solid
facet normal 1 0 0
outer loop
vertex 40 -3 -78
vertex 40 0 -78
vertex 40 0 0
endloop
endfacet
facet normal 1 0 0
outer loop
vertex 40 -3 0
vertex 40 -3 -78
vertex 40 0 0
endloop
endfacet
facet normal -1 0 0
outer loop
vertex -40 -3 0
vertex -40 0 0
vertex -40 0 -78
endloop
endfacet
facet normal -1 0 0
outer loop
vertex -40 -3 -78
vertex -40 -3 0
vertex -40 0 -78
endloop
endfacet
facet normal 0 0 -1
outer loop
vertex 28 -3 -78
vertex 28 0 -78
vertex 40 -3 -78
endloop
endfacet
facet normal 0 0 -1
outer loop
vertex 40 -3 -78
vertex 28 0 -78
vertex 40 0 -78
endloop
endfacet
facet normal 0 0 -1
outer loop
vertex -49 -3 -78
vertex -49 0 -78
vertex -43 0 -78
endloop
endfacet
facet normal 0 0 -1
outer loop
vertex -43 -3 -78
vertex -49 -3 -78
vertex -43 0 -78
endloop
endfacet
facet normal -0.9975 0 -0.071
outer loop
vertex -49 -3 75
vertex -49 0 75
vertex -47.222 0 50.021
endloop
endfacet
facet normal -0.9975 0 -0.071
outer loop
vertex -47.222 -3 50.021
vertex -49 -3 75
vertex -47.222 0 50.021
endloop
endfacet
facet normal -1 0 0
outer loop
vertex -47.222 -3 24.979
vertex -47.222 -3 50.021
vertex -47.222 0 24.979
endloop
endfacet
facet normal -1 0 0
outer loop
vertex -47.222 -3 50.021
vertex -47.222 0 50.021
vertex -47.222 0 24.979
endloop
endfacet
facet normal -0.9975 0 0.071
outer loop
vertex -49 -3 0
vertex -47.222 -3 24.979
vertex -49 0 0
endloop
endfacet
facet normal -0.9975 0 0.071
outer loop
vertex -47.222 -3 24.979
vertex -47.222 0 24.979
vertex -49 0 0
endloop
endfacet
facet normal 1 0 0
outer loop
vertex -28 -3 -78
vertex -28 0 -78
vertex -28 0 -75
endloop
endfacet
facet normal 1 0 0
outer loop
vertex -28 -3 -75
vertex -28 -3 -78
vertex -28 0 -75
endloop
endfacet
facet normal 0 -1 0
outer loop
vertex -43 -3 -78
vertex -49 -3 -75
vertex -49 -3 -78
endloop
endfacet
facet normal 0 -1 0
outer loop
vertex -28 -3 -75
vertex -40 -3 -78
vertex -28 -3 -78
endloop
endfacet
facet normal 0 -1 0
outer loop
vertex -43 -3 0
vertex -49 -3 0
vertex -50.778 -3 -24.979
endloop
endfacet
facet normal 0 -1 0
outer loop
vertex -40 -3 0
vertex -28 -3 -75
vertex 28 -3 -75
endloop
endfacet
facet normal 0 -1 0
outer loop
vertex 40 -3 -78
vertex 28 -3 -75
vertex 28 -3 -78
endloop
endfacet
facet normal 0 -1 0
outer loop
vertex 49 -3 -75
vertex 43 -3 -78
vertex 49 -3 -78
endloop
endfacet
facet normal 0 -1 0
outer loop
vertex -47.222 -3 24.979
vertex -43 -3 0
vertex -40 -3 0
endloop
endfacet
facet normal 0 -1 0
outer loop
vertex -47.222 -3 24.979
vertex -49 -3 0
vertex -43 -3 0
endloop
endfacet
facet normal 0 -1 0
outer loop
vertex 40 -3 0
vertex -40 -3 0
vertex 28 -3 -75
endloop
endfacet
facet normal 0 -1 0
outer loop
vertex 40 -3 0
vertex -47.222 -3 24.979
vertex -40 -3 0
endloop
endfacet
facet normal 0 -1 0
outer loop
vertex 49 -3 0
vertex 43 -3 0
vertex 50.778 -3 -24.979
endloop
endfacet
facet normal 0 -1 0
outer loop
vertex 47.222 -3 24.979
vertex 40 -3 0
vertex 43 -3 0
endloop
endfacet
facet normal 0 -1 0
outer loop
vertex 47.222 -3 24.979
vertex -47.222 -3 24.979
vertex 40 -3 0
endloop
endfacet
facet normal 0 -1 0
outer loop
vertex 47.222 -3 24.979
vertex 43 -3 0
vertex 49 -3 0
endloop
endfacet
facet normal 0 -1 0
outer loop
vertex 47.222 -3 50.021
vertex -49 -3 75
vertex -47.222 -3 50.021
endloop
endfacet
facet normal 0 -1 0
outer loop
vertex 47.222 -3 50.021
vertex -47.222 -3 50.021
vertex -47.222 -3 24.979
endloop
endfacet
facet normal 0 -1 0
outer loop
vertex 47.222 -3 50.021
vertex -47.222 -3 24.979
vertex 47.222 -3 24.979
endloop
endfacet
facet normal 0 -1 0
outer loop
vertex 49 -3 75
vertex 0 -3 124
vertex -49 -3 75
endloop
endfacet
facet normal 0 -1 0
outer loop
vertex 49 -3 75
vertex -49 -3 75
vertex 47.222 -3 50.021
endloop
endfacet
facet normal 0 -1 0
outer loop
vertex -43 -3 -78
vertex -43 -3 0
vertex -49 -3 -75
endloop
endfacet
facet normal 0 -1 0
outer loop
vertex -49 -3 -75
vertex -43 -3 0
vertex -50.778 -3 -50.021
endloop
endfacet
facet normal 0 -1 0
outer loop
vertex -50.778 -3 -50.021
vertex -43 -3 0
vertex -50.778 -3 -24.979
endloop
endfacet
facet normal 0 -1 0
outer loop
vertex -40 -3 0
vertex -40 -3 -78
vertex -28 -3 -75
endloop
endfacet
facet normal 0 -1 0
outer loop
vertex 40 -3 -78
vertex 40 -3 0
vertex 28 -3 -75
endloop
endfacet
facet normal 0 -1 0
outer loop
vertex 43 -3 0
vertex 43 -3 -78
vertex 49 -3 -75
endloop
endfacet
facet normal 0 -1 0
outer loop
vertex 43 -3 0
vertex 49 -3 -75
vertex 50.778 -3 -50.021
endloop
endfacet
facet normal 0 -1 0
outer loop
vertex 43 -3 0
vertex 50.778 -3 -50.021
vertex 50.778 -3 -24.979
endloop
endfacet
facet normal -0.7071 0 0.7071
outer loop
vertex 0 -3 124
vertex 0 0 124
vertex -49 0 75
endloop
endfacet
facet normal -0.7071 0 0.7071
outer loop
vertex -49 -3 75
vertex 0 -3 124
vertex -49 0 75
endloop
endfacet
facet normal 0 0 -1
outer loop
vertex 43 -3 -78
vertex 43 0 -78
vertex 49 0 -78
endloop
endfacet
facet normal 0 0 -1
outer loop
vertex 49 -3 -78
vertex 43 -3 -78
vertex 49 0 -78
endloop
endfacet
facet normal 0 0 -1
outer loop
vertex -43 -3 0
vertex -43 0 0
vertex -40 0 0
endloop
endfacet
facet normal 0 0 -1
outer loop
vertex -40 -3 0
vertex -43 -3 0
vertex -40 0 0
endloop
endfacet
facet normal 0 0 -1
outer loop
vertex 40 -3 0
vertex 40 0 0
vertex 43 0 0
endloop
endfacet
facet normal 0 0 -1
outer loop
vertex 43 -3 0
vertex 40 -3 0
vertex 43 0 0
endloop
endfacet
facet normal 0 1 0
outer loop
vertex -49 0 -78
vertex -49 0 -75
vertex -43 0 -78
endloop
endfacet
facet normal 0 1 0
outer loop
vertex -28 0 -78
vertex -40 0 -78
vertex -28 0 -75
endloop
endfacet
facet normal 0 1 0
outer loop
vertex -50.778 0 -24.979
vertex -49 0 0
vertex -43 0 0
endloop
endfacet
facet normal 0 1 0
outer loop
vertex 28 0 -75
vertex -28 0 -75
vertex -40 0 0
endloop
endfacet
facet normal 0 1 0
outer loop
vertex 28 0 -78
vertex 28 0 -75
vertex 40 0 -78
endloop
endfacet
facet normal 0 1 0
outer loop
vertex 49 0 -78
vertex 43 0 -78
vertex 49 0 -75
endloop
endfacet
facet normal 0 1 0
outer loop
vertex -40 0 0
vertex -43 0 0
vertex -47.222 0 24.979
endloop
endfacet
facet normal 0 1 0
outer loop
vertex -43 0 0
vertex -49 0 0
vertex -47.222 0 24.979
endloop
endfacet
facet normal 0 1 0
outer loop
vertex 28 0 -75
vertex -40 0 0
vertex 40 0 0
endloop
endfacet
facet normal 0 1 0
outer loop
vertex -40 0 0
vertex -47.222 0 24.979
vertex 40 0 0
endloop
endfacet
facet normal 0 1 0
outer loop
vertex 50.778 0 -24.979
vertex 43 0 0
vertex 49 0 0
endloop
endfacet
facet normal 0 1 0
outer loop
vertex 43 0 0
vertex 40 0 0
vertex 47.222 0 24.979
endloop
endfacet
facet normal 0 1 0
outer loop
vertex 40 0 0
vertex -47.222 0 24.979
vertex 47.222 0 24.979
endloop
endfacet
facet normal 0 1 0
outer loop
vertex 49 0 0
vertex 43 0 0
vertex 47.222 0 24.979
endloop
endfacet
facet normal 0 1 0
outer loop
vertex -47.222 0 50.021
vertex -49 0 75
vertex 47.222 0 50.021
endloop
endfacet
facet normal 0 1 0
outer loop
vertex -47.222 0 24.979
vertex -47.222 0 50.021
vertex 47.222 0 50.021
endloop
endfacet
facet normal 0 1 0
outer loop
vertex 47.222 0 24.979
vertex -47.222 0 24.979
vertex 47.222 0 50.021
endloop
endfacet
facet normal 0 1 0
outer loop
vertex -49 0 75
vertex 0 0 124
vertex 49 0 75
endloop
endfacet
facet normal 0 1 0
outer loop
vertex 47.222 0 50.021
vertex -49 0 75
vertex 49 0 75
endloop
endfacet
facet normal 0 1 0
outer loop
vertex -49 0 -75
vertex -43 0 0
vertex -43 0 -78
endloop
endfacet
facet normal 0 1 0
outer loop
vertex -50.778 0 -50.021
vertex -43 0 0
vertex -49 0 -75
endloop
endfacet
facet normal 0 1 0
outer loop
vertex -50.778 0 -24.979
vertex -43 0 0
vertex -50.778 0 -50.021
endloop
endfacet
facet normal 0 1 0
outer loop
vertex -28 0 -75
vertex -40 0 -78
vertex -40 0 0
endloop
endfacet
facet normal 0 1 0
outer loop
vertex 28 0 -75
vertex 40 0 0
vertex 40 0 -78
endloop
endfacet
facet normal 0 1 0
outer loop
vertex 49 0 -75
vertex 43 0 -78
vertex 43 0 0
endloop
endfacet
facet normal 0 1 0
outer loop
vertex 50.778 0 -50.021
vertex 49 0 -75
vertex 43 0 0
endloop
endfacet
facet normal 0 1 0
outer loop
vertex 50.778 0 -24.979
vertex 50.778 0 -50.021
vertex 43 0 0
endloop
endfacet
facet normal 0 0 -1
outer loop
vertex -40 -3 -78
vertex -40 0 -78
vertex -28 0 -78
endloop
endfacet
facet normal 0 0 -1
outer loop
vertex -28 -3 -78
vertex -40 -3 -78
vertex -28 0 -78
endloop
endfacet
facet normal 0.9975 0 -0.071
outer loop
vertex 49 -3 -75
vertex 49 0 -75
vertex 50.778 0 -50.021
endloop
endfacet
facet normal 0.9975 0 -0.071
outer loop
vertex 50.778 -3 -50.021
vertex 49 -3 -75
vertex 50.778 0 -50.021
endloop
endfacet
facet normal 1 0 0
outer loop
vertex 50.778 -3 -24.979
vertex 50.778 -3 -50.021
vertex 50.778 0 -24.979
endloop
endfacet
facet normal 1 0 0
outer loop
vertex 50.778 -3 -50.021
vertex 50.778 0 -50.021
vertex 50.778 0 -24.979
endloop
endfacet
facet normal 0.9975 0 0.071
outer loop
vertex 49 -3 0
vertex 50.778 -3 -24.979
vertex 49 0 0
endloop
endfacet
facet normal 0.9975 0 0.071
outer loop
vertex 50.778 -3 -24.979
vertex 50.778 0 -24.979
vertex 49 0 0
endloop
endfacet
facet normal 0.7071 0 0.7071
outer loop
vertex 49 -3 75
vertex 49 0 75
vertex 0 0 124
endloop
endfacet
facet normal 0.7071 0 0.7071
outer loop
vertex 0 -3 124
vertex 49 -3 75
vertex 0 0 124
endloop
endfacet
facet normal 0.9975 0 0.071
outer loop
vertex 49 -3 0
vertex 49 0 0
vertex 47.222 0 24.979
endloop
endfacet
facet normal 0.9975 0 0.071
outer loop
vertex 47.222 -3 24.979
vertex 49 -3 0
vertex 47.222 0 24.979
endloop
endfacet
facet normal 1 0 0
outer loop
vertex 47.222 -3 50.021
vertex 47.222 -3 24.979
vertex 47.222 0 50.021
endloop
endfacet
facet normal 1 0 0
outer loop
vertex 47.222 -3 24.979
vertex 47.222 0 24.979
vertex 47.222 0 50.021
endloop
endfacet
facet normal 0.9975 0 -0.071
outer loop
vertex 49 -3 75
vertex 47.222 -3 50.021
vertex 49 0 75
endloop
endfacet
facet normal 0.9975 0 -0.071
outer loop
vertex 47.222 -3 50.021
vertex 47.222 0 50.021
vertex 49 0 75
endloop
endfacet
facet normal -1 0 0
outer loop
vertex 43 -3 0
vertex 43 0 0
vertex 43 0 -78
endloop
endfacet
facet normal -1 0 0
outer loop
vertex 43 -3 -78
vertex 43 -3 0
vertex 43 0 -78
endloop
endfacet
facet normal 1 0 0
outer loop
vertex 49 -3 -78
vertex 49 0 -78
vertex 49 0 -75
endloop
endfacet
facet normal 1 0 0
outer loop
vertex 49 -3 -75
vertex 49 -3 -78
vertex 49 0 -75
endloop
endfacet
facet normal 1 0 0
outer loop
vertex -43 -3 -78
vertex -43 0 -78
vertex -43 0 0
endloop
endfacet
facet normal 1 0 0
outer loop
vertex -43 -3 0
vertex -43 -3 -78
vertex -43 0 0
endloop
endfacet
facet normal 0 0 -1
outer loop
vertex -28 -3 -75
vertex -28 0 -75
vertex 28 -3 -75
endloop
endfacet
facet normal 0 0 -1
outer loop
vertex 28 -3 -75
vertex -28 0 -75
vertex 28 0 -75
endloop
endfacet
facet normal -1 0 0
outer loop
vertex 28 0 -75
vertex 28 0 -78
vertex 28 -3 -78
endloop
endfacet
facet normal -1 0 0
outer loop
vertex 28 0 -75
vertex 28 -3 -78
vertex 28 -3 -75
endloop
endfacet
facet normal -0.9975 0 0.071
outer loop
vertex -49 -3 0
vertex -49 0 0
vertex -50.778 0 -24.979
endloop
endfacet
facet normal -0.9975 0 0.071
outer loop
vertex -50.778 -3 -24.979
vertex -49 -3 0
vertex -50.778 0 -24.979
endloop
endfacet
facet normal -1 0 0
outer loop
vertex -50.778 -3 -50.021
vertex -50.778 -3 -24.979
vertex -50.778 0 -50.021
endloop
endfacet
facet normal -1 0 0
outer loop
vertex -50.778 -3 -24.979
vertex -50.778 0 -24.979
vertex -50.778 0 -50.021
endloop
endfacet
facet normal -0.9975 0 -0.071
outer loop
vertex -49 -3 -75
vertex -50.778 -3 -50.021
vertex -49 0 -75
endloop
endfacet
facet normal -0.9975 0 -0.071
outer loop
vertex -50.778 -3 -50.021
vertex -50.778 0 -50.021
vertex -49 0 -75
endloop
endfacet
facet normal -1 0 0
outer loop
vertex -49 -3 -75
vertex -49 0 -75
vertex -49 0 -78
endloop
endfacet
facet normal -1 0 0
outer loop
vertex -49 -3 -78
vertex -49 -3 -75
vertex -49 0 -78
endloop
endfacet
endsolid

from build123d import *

# Parameters (mm, degrees)
F1_W     = 6
F1_H     = 3
F1_W_2   = 12
F2_DEPTH = 3


with BuildPart() as f2:
    # F1 (on Front) → F2 (new body)
    with BuildSketch(Plane.XZ):
        Polygon((-49, 75), (49, 75), (0, 124), align=None)
        with BuildLine():
            Line((43, -75), (49, -75))
            Line((49, -75), (49, 0))
            ThreePointArc((49, 0), (47, 37.5), (49, 75))
            Line((49, 75), (-49, 75))
            ThreePointArc((-49, 75), (-47, 37.5), (-49, 0))
            Line((-49, 0), (-49, -75))
            Line((-49, -75), (-43, -75))
            Line((-43, -75), (-43, 0))
            Line((-43, 0), (-40, 0))
            Line((-40, 0), (-40, -75))
            Line((-40, -75), (-28, -75))
            Line((-28, -75), (28, -75))
            Line((28, -75), (40, -75))
            Line((40, -75), (40, 0))
            Line((40, 0), (43, 0))
            Line((43, 0), (43, -75))
        make_face()
        with Locations((-46, -76.5)):
            Rectangle(F1_W, F1_H)
        with Locations((-34, -76.5)):
            Rectangle(F1_W_2, F1_H)
        with Locations((34, -76.5)):
            Rectangle(F1_W_2, F1_H)
        with Locations((46, -76.5)):
            Rectangle(F1_W, F1_H)
        with BuildLine():
            Line((-49, -75), (-49, 0))
            ThreePointArc((-49, 0), (-51, -37.5), (-49, -75))
        make_face()
        with BuildLine():
            Line((49, 0), (49, -75))
            ThreePointArc((49, -75), (51, -37.5), (49, 0))
        make_face()
    extrude(amount=F2_DEPTH)


solid = f2.part
